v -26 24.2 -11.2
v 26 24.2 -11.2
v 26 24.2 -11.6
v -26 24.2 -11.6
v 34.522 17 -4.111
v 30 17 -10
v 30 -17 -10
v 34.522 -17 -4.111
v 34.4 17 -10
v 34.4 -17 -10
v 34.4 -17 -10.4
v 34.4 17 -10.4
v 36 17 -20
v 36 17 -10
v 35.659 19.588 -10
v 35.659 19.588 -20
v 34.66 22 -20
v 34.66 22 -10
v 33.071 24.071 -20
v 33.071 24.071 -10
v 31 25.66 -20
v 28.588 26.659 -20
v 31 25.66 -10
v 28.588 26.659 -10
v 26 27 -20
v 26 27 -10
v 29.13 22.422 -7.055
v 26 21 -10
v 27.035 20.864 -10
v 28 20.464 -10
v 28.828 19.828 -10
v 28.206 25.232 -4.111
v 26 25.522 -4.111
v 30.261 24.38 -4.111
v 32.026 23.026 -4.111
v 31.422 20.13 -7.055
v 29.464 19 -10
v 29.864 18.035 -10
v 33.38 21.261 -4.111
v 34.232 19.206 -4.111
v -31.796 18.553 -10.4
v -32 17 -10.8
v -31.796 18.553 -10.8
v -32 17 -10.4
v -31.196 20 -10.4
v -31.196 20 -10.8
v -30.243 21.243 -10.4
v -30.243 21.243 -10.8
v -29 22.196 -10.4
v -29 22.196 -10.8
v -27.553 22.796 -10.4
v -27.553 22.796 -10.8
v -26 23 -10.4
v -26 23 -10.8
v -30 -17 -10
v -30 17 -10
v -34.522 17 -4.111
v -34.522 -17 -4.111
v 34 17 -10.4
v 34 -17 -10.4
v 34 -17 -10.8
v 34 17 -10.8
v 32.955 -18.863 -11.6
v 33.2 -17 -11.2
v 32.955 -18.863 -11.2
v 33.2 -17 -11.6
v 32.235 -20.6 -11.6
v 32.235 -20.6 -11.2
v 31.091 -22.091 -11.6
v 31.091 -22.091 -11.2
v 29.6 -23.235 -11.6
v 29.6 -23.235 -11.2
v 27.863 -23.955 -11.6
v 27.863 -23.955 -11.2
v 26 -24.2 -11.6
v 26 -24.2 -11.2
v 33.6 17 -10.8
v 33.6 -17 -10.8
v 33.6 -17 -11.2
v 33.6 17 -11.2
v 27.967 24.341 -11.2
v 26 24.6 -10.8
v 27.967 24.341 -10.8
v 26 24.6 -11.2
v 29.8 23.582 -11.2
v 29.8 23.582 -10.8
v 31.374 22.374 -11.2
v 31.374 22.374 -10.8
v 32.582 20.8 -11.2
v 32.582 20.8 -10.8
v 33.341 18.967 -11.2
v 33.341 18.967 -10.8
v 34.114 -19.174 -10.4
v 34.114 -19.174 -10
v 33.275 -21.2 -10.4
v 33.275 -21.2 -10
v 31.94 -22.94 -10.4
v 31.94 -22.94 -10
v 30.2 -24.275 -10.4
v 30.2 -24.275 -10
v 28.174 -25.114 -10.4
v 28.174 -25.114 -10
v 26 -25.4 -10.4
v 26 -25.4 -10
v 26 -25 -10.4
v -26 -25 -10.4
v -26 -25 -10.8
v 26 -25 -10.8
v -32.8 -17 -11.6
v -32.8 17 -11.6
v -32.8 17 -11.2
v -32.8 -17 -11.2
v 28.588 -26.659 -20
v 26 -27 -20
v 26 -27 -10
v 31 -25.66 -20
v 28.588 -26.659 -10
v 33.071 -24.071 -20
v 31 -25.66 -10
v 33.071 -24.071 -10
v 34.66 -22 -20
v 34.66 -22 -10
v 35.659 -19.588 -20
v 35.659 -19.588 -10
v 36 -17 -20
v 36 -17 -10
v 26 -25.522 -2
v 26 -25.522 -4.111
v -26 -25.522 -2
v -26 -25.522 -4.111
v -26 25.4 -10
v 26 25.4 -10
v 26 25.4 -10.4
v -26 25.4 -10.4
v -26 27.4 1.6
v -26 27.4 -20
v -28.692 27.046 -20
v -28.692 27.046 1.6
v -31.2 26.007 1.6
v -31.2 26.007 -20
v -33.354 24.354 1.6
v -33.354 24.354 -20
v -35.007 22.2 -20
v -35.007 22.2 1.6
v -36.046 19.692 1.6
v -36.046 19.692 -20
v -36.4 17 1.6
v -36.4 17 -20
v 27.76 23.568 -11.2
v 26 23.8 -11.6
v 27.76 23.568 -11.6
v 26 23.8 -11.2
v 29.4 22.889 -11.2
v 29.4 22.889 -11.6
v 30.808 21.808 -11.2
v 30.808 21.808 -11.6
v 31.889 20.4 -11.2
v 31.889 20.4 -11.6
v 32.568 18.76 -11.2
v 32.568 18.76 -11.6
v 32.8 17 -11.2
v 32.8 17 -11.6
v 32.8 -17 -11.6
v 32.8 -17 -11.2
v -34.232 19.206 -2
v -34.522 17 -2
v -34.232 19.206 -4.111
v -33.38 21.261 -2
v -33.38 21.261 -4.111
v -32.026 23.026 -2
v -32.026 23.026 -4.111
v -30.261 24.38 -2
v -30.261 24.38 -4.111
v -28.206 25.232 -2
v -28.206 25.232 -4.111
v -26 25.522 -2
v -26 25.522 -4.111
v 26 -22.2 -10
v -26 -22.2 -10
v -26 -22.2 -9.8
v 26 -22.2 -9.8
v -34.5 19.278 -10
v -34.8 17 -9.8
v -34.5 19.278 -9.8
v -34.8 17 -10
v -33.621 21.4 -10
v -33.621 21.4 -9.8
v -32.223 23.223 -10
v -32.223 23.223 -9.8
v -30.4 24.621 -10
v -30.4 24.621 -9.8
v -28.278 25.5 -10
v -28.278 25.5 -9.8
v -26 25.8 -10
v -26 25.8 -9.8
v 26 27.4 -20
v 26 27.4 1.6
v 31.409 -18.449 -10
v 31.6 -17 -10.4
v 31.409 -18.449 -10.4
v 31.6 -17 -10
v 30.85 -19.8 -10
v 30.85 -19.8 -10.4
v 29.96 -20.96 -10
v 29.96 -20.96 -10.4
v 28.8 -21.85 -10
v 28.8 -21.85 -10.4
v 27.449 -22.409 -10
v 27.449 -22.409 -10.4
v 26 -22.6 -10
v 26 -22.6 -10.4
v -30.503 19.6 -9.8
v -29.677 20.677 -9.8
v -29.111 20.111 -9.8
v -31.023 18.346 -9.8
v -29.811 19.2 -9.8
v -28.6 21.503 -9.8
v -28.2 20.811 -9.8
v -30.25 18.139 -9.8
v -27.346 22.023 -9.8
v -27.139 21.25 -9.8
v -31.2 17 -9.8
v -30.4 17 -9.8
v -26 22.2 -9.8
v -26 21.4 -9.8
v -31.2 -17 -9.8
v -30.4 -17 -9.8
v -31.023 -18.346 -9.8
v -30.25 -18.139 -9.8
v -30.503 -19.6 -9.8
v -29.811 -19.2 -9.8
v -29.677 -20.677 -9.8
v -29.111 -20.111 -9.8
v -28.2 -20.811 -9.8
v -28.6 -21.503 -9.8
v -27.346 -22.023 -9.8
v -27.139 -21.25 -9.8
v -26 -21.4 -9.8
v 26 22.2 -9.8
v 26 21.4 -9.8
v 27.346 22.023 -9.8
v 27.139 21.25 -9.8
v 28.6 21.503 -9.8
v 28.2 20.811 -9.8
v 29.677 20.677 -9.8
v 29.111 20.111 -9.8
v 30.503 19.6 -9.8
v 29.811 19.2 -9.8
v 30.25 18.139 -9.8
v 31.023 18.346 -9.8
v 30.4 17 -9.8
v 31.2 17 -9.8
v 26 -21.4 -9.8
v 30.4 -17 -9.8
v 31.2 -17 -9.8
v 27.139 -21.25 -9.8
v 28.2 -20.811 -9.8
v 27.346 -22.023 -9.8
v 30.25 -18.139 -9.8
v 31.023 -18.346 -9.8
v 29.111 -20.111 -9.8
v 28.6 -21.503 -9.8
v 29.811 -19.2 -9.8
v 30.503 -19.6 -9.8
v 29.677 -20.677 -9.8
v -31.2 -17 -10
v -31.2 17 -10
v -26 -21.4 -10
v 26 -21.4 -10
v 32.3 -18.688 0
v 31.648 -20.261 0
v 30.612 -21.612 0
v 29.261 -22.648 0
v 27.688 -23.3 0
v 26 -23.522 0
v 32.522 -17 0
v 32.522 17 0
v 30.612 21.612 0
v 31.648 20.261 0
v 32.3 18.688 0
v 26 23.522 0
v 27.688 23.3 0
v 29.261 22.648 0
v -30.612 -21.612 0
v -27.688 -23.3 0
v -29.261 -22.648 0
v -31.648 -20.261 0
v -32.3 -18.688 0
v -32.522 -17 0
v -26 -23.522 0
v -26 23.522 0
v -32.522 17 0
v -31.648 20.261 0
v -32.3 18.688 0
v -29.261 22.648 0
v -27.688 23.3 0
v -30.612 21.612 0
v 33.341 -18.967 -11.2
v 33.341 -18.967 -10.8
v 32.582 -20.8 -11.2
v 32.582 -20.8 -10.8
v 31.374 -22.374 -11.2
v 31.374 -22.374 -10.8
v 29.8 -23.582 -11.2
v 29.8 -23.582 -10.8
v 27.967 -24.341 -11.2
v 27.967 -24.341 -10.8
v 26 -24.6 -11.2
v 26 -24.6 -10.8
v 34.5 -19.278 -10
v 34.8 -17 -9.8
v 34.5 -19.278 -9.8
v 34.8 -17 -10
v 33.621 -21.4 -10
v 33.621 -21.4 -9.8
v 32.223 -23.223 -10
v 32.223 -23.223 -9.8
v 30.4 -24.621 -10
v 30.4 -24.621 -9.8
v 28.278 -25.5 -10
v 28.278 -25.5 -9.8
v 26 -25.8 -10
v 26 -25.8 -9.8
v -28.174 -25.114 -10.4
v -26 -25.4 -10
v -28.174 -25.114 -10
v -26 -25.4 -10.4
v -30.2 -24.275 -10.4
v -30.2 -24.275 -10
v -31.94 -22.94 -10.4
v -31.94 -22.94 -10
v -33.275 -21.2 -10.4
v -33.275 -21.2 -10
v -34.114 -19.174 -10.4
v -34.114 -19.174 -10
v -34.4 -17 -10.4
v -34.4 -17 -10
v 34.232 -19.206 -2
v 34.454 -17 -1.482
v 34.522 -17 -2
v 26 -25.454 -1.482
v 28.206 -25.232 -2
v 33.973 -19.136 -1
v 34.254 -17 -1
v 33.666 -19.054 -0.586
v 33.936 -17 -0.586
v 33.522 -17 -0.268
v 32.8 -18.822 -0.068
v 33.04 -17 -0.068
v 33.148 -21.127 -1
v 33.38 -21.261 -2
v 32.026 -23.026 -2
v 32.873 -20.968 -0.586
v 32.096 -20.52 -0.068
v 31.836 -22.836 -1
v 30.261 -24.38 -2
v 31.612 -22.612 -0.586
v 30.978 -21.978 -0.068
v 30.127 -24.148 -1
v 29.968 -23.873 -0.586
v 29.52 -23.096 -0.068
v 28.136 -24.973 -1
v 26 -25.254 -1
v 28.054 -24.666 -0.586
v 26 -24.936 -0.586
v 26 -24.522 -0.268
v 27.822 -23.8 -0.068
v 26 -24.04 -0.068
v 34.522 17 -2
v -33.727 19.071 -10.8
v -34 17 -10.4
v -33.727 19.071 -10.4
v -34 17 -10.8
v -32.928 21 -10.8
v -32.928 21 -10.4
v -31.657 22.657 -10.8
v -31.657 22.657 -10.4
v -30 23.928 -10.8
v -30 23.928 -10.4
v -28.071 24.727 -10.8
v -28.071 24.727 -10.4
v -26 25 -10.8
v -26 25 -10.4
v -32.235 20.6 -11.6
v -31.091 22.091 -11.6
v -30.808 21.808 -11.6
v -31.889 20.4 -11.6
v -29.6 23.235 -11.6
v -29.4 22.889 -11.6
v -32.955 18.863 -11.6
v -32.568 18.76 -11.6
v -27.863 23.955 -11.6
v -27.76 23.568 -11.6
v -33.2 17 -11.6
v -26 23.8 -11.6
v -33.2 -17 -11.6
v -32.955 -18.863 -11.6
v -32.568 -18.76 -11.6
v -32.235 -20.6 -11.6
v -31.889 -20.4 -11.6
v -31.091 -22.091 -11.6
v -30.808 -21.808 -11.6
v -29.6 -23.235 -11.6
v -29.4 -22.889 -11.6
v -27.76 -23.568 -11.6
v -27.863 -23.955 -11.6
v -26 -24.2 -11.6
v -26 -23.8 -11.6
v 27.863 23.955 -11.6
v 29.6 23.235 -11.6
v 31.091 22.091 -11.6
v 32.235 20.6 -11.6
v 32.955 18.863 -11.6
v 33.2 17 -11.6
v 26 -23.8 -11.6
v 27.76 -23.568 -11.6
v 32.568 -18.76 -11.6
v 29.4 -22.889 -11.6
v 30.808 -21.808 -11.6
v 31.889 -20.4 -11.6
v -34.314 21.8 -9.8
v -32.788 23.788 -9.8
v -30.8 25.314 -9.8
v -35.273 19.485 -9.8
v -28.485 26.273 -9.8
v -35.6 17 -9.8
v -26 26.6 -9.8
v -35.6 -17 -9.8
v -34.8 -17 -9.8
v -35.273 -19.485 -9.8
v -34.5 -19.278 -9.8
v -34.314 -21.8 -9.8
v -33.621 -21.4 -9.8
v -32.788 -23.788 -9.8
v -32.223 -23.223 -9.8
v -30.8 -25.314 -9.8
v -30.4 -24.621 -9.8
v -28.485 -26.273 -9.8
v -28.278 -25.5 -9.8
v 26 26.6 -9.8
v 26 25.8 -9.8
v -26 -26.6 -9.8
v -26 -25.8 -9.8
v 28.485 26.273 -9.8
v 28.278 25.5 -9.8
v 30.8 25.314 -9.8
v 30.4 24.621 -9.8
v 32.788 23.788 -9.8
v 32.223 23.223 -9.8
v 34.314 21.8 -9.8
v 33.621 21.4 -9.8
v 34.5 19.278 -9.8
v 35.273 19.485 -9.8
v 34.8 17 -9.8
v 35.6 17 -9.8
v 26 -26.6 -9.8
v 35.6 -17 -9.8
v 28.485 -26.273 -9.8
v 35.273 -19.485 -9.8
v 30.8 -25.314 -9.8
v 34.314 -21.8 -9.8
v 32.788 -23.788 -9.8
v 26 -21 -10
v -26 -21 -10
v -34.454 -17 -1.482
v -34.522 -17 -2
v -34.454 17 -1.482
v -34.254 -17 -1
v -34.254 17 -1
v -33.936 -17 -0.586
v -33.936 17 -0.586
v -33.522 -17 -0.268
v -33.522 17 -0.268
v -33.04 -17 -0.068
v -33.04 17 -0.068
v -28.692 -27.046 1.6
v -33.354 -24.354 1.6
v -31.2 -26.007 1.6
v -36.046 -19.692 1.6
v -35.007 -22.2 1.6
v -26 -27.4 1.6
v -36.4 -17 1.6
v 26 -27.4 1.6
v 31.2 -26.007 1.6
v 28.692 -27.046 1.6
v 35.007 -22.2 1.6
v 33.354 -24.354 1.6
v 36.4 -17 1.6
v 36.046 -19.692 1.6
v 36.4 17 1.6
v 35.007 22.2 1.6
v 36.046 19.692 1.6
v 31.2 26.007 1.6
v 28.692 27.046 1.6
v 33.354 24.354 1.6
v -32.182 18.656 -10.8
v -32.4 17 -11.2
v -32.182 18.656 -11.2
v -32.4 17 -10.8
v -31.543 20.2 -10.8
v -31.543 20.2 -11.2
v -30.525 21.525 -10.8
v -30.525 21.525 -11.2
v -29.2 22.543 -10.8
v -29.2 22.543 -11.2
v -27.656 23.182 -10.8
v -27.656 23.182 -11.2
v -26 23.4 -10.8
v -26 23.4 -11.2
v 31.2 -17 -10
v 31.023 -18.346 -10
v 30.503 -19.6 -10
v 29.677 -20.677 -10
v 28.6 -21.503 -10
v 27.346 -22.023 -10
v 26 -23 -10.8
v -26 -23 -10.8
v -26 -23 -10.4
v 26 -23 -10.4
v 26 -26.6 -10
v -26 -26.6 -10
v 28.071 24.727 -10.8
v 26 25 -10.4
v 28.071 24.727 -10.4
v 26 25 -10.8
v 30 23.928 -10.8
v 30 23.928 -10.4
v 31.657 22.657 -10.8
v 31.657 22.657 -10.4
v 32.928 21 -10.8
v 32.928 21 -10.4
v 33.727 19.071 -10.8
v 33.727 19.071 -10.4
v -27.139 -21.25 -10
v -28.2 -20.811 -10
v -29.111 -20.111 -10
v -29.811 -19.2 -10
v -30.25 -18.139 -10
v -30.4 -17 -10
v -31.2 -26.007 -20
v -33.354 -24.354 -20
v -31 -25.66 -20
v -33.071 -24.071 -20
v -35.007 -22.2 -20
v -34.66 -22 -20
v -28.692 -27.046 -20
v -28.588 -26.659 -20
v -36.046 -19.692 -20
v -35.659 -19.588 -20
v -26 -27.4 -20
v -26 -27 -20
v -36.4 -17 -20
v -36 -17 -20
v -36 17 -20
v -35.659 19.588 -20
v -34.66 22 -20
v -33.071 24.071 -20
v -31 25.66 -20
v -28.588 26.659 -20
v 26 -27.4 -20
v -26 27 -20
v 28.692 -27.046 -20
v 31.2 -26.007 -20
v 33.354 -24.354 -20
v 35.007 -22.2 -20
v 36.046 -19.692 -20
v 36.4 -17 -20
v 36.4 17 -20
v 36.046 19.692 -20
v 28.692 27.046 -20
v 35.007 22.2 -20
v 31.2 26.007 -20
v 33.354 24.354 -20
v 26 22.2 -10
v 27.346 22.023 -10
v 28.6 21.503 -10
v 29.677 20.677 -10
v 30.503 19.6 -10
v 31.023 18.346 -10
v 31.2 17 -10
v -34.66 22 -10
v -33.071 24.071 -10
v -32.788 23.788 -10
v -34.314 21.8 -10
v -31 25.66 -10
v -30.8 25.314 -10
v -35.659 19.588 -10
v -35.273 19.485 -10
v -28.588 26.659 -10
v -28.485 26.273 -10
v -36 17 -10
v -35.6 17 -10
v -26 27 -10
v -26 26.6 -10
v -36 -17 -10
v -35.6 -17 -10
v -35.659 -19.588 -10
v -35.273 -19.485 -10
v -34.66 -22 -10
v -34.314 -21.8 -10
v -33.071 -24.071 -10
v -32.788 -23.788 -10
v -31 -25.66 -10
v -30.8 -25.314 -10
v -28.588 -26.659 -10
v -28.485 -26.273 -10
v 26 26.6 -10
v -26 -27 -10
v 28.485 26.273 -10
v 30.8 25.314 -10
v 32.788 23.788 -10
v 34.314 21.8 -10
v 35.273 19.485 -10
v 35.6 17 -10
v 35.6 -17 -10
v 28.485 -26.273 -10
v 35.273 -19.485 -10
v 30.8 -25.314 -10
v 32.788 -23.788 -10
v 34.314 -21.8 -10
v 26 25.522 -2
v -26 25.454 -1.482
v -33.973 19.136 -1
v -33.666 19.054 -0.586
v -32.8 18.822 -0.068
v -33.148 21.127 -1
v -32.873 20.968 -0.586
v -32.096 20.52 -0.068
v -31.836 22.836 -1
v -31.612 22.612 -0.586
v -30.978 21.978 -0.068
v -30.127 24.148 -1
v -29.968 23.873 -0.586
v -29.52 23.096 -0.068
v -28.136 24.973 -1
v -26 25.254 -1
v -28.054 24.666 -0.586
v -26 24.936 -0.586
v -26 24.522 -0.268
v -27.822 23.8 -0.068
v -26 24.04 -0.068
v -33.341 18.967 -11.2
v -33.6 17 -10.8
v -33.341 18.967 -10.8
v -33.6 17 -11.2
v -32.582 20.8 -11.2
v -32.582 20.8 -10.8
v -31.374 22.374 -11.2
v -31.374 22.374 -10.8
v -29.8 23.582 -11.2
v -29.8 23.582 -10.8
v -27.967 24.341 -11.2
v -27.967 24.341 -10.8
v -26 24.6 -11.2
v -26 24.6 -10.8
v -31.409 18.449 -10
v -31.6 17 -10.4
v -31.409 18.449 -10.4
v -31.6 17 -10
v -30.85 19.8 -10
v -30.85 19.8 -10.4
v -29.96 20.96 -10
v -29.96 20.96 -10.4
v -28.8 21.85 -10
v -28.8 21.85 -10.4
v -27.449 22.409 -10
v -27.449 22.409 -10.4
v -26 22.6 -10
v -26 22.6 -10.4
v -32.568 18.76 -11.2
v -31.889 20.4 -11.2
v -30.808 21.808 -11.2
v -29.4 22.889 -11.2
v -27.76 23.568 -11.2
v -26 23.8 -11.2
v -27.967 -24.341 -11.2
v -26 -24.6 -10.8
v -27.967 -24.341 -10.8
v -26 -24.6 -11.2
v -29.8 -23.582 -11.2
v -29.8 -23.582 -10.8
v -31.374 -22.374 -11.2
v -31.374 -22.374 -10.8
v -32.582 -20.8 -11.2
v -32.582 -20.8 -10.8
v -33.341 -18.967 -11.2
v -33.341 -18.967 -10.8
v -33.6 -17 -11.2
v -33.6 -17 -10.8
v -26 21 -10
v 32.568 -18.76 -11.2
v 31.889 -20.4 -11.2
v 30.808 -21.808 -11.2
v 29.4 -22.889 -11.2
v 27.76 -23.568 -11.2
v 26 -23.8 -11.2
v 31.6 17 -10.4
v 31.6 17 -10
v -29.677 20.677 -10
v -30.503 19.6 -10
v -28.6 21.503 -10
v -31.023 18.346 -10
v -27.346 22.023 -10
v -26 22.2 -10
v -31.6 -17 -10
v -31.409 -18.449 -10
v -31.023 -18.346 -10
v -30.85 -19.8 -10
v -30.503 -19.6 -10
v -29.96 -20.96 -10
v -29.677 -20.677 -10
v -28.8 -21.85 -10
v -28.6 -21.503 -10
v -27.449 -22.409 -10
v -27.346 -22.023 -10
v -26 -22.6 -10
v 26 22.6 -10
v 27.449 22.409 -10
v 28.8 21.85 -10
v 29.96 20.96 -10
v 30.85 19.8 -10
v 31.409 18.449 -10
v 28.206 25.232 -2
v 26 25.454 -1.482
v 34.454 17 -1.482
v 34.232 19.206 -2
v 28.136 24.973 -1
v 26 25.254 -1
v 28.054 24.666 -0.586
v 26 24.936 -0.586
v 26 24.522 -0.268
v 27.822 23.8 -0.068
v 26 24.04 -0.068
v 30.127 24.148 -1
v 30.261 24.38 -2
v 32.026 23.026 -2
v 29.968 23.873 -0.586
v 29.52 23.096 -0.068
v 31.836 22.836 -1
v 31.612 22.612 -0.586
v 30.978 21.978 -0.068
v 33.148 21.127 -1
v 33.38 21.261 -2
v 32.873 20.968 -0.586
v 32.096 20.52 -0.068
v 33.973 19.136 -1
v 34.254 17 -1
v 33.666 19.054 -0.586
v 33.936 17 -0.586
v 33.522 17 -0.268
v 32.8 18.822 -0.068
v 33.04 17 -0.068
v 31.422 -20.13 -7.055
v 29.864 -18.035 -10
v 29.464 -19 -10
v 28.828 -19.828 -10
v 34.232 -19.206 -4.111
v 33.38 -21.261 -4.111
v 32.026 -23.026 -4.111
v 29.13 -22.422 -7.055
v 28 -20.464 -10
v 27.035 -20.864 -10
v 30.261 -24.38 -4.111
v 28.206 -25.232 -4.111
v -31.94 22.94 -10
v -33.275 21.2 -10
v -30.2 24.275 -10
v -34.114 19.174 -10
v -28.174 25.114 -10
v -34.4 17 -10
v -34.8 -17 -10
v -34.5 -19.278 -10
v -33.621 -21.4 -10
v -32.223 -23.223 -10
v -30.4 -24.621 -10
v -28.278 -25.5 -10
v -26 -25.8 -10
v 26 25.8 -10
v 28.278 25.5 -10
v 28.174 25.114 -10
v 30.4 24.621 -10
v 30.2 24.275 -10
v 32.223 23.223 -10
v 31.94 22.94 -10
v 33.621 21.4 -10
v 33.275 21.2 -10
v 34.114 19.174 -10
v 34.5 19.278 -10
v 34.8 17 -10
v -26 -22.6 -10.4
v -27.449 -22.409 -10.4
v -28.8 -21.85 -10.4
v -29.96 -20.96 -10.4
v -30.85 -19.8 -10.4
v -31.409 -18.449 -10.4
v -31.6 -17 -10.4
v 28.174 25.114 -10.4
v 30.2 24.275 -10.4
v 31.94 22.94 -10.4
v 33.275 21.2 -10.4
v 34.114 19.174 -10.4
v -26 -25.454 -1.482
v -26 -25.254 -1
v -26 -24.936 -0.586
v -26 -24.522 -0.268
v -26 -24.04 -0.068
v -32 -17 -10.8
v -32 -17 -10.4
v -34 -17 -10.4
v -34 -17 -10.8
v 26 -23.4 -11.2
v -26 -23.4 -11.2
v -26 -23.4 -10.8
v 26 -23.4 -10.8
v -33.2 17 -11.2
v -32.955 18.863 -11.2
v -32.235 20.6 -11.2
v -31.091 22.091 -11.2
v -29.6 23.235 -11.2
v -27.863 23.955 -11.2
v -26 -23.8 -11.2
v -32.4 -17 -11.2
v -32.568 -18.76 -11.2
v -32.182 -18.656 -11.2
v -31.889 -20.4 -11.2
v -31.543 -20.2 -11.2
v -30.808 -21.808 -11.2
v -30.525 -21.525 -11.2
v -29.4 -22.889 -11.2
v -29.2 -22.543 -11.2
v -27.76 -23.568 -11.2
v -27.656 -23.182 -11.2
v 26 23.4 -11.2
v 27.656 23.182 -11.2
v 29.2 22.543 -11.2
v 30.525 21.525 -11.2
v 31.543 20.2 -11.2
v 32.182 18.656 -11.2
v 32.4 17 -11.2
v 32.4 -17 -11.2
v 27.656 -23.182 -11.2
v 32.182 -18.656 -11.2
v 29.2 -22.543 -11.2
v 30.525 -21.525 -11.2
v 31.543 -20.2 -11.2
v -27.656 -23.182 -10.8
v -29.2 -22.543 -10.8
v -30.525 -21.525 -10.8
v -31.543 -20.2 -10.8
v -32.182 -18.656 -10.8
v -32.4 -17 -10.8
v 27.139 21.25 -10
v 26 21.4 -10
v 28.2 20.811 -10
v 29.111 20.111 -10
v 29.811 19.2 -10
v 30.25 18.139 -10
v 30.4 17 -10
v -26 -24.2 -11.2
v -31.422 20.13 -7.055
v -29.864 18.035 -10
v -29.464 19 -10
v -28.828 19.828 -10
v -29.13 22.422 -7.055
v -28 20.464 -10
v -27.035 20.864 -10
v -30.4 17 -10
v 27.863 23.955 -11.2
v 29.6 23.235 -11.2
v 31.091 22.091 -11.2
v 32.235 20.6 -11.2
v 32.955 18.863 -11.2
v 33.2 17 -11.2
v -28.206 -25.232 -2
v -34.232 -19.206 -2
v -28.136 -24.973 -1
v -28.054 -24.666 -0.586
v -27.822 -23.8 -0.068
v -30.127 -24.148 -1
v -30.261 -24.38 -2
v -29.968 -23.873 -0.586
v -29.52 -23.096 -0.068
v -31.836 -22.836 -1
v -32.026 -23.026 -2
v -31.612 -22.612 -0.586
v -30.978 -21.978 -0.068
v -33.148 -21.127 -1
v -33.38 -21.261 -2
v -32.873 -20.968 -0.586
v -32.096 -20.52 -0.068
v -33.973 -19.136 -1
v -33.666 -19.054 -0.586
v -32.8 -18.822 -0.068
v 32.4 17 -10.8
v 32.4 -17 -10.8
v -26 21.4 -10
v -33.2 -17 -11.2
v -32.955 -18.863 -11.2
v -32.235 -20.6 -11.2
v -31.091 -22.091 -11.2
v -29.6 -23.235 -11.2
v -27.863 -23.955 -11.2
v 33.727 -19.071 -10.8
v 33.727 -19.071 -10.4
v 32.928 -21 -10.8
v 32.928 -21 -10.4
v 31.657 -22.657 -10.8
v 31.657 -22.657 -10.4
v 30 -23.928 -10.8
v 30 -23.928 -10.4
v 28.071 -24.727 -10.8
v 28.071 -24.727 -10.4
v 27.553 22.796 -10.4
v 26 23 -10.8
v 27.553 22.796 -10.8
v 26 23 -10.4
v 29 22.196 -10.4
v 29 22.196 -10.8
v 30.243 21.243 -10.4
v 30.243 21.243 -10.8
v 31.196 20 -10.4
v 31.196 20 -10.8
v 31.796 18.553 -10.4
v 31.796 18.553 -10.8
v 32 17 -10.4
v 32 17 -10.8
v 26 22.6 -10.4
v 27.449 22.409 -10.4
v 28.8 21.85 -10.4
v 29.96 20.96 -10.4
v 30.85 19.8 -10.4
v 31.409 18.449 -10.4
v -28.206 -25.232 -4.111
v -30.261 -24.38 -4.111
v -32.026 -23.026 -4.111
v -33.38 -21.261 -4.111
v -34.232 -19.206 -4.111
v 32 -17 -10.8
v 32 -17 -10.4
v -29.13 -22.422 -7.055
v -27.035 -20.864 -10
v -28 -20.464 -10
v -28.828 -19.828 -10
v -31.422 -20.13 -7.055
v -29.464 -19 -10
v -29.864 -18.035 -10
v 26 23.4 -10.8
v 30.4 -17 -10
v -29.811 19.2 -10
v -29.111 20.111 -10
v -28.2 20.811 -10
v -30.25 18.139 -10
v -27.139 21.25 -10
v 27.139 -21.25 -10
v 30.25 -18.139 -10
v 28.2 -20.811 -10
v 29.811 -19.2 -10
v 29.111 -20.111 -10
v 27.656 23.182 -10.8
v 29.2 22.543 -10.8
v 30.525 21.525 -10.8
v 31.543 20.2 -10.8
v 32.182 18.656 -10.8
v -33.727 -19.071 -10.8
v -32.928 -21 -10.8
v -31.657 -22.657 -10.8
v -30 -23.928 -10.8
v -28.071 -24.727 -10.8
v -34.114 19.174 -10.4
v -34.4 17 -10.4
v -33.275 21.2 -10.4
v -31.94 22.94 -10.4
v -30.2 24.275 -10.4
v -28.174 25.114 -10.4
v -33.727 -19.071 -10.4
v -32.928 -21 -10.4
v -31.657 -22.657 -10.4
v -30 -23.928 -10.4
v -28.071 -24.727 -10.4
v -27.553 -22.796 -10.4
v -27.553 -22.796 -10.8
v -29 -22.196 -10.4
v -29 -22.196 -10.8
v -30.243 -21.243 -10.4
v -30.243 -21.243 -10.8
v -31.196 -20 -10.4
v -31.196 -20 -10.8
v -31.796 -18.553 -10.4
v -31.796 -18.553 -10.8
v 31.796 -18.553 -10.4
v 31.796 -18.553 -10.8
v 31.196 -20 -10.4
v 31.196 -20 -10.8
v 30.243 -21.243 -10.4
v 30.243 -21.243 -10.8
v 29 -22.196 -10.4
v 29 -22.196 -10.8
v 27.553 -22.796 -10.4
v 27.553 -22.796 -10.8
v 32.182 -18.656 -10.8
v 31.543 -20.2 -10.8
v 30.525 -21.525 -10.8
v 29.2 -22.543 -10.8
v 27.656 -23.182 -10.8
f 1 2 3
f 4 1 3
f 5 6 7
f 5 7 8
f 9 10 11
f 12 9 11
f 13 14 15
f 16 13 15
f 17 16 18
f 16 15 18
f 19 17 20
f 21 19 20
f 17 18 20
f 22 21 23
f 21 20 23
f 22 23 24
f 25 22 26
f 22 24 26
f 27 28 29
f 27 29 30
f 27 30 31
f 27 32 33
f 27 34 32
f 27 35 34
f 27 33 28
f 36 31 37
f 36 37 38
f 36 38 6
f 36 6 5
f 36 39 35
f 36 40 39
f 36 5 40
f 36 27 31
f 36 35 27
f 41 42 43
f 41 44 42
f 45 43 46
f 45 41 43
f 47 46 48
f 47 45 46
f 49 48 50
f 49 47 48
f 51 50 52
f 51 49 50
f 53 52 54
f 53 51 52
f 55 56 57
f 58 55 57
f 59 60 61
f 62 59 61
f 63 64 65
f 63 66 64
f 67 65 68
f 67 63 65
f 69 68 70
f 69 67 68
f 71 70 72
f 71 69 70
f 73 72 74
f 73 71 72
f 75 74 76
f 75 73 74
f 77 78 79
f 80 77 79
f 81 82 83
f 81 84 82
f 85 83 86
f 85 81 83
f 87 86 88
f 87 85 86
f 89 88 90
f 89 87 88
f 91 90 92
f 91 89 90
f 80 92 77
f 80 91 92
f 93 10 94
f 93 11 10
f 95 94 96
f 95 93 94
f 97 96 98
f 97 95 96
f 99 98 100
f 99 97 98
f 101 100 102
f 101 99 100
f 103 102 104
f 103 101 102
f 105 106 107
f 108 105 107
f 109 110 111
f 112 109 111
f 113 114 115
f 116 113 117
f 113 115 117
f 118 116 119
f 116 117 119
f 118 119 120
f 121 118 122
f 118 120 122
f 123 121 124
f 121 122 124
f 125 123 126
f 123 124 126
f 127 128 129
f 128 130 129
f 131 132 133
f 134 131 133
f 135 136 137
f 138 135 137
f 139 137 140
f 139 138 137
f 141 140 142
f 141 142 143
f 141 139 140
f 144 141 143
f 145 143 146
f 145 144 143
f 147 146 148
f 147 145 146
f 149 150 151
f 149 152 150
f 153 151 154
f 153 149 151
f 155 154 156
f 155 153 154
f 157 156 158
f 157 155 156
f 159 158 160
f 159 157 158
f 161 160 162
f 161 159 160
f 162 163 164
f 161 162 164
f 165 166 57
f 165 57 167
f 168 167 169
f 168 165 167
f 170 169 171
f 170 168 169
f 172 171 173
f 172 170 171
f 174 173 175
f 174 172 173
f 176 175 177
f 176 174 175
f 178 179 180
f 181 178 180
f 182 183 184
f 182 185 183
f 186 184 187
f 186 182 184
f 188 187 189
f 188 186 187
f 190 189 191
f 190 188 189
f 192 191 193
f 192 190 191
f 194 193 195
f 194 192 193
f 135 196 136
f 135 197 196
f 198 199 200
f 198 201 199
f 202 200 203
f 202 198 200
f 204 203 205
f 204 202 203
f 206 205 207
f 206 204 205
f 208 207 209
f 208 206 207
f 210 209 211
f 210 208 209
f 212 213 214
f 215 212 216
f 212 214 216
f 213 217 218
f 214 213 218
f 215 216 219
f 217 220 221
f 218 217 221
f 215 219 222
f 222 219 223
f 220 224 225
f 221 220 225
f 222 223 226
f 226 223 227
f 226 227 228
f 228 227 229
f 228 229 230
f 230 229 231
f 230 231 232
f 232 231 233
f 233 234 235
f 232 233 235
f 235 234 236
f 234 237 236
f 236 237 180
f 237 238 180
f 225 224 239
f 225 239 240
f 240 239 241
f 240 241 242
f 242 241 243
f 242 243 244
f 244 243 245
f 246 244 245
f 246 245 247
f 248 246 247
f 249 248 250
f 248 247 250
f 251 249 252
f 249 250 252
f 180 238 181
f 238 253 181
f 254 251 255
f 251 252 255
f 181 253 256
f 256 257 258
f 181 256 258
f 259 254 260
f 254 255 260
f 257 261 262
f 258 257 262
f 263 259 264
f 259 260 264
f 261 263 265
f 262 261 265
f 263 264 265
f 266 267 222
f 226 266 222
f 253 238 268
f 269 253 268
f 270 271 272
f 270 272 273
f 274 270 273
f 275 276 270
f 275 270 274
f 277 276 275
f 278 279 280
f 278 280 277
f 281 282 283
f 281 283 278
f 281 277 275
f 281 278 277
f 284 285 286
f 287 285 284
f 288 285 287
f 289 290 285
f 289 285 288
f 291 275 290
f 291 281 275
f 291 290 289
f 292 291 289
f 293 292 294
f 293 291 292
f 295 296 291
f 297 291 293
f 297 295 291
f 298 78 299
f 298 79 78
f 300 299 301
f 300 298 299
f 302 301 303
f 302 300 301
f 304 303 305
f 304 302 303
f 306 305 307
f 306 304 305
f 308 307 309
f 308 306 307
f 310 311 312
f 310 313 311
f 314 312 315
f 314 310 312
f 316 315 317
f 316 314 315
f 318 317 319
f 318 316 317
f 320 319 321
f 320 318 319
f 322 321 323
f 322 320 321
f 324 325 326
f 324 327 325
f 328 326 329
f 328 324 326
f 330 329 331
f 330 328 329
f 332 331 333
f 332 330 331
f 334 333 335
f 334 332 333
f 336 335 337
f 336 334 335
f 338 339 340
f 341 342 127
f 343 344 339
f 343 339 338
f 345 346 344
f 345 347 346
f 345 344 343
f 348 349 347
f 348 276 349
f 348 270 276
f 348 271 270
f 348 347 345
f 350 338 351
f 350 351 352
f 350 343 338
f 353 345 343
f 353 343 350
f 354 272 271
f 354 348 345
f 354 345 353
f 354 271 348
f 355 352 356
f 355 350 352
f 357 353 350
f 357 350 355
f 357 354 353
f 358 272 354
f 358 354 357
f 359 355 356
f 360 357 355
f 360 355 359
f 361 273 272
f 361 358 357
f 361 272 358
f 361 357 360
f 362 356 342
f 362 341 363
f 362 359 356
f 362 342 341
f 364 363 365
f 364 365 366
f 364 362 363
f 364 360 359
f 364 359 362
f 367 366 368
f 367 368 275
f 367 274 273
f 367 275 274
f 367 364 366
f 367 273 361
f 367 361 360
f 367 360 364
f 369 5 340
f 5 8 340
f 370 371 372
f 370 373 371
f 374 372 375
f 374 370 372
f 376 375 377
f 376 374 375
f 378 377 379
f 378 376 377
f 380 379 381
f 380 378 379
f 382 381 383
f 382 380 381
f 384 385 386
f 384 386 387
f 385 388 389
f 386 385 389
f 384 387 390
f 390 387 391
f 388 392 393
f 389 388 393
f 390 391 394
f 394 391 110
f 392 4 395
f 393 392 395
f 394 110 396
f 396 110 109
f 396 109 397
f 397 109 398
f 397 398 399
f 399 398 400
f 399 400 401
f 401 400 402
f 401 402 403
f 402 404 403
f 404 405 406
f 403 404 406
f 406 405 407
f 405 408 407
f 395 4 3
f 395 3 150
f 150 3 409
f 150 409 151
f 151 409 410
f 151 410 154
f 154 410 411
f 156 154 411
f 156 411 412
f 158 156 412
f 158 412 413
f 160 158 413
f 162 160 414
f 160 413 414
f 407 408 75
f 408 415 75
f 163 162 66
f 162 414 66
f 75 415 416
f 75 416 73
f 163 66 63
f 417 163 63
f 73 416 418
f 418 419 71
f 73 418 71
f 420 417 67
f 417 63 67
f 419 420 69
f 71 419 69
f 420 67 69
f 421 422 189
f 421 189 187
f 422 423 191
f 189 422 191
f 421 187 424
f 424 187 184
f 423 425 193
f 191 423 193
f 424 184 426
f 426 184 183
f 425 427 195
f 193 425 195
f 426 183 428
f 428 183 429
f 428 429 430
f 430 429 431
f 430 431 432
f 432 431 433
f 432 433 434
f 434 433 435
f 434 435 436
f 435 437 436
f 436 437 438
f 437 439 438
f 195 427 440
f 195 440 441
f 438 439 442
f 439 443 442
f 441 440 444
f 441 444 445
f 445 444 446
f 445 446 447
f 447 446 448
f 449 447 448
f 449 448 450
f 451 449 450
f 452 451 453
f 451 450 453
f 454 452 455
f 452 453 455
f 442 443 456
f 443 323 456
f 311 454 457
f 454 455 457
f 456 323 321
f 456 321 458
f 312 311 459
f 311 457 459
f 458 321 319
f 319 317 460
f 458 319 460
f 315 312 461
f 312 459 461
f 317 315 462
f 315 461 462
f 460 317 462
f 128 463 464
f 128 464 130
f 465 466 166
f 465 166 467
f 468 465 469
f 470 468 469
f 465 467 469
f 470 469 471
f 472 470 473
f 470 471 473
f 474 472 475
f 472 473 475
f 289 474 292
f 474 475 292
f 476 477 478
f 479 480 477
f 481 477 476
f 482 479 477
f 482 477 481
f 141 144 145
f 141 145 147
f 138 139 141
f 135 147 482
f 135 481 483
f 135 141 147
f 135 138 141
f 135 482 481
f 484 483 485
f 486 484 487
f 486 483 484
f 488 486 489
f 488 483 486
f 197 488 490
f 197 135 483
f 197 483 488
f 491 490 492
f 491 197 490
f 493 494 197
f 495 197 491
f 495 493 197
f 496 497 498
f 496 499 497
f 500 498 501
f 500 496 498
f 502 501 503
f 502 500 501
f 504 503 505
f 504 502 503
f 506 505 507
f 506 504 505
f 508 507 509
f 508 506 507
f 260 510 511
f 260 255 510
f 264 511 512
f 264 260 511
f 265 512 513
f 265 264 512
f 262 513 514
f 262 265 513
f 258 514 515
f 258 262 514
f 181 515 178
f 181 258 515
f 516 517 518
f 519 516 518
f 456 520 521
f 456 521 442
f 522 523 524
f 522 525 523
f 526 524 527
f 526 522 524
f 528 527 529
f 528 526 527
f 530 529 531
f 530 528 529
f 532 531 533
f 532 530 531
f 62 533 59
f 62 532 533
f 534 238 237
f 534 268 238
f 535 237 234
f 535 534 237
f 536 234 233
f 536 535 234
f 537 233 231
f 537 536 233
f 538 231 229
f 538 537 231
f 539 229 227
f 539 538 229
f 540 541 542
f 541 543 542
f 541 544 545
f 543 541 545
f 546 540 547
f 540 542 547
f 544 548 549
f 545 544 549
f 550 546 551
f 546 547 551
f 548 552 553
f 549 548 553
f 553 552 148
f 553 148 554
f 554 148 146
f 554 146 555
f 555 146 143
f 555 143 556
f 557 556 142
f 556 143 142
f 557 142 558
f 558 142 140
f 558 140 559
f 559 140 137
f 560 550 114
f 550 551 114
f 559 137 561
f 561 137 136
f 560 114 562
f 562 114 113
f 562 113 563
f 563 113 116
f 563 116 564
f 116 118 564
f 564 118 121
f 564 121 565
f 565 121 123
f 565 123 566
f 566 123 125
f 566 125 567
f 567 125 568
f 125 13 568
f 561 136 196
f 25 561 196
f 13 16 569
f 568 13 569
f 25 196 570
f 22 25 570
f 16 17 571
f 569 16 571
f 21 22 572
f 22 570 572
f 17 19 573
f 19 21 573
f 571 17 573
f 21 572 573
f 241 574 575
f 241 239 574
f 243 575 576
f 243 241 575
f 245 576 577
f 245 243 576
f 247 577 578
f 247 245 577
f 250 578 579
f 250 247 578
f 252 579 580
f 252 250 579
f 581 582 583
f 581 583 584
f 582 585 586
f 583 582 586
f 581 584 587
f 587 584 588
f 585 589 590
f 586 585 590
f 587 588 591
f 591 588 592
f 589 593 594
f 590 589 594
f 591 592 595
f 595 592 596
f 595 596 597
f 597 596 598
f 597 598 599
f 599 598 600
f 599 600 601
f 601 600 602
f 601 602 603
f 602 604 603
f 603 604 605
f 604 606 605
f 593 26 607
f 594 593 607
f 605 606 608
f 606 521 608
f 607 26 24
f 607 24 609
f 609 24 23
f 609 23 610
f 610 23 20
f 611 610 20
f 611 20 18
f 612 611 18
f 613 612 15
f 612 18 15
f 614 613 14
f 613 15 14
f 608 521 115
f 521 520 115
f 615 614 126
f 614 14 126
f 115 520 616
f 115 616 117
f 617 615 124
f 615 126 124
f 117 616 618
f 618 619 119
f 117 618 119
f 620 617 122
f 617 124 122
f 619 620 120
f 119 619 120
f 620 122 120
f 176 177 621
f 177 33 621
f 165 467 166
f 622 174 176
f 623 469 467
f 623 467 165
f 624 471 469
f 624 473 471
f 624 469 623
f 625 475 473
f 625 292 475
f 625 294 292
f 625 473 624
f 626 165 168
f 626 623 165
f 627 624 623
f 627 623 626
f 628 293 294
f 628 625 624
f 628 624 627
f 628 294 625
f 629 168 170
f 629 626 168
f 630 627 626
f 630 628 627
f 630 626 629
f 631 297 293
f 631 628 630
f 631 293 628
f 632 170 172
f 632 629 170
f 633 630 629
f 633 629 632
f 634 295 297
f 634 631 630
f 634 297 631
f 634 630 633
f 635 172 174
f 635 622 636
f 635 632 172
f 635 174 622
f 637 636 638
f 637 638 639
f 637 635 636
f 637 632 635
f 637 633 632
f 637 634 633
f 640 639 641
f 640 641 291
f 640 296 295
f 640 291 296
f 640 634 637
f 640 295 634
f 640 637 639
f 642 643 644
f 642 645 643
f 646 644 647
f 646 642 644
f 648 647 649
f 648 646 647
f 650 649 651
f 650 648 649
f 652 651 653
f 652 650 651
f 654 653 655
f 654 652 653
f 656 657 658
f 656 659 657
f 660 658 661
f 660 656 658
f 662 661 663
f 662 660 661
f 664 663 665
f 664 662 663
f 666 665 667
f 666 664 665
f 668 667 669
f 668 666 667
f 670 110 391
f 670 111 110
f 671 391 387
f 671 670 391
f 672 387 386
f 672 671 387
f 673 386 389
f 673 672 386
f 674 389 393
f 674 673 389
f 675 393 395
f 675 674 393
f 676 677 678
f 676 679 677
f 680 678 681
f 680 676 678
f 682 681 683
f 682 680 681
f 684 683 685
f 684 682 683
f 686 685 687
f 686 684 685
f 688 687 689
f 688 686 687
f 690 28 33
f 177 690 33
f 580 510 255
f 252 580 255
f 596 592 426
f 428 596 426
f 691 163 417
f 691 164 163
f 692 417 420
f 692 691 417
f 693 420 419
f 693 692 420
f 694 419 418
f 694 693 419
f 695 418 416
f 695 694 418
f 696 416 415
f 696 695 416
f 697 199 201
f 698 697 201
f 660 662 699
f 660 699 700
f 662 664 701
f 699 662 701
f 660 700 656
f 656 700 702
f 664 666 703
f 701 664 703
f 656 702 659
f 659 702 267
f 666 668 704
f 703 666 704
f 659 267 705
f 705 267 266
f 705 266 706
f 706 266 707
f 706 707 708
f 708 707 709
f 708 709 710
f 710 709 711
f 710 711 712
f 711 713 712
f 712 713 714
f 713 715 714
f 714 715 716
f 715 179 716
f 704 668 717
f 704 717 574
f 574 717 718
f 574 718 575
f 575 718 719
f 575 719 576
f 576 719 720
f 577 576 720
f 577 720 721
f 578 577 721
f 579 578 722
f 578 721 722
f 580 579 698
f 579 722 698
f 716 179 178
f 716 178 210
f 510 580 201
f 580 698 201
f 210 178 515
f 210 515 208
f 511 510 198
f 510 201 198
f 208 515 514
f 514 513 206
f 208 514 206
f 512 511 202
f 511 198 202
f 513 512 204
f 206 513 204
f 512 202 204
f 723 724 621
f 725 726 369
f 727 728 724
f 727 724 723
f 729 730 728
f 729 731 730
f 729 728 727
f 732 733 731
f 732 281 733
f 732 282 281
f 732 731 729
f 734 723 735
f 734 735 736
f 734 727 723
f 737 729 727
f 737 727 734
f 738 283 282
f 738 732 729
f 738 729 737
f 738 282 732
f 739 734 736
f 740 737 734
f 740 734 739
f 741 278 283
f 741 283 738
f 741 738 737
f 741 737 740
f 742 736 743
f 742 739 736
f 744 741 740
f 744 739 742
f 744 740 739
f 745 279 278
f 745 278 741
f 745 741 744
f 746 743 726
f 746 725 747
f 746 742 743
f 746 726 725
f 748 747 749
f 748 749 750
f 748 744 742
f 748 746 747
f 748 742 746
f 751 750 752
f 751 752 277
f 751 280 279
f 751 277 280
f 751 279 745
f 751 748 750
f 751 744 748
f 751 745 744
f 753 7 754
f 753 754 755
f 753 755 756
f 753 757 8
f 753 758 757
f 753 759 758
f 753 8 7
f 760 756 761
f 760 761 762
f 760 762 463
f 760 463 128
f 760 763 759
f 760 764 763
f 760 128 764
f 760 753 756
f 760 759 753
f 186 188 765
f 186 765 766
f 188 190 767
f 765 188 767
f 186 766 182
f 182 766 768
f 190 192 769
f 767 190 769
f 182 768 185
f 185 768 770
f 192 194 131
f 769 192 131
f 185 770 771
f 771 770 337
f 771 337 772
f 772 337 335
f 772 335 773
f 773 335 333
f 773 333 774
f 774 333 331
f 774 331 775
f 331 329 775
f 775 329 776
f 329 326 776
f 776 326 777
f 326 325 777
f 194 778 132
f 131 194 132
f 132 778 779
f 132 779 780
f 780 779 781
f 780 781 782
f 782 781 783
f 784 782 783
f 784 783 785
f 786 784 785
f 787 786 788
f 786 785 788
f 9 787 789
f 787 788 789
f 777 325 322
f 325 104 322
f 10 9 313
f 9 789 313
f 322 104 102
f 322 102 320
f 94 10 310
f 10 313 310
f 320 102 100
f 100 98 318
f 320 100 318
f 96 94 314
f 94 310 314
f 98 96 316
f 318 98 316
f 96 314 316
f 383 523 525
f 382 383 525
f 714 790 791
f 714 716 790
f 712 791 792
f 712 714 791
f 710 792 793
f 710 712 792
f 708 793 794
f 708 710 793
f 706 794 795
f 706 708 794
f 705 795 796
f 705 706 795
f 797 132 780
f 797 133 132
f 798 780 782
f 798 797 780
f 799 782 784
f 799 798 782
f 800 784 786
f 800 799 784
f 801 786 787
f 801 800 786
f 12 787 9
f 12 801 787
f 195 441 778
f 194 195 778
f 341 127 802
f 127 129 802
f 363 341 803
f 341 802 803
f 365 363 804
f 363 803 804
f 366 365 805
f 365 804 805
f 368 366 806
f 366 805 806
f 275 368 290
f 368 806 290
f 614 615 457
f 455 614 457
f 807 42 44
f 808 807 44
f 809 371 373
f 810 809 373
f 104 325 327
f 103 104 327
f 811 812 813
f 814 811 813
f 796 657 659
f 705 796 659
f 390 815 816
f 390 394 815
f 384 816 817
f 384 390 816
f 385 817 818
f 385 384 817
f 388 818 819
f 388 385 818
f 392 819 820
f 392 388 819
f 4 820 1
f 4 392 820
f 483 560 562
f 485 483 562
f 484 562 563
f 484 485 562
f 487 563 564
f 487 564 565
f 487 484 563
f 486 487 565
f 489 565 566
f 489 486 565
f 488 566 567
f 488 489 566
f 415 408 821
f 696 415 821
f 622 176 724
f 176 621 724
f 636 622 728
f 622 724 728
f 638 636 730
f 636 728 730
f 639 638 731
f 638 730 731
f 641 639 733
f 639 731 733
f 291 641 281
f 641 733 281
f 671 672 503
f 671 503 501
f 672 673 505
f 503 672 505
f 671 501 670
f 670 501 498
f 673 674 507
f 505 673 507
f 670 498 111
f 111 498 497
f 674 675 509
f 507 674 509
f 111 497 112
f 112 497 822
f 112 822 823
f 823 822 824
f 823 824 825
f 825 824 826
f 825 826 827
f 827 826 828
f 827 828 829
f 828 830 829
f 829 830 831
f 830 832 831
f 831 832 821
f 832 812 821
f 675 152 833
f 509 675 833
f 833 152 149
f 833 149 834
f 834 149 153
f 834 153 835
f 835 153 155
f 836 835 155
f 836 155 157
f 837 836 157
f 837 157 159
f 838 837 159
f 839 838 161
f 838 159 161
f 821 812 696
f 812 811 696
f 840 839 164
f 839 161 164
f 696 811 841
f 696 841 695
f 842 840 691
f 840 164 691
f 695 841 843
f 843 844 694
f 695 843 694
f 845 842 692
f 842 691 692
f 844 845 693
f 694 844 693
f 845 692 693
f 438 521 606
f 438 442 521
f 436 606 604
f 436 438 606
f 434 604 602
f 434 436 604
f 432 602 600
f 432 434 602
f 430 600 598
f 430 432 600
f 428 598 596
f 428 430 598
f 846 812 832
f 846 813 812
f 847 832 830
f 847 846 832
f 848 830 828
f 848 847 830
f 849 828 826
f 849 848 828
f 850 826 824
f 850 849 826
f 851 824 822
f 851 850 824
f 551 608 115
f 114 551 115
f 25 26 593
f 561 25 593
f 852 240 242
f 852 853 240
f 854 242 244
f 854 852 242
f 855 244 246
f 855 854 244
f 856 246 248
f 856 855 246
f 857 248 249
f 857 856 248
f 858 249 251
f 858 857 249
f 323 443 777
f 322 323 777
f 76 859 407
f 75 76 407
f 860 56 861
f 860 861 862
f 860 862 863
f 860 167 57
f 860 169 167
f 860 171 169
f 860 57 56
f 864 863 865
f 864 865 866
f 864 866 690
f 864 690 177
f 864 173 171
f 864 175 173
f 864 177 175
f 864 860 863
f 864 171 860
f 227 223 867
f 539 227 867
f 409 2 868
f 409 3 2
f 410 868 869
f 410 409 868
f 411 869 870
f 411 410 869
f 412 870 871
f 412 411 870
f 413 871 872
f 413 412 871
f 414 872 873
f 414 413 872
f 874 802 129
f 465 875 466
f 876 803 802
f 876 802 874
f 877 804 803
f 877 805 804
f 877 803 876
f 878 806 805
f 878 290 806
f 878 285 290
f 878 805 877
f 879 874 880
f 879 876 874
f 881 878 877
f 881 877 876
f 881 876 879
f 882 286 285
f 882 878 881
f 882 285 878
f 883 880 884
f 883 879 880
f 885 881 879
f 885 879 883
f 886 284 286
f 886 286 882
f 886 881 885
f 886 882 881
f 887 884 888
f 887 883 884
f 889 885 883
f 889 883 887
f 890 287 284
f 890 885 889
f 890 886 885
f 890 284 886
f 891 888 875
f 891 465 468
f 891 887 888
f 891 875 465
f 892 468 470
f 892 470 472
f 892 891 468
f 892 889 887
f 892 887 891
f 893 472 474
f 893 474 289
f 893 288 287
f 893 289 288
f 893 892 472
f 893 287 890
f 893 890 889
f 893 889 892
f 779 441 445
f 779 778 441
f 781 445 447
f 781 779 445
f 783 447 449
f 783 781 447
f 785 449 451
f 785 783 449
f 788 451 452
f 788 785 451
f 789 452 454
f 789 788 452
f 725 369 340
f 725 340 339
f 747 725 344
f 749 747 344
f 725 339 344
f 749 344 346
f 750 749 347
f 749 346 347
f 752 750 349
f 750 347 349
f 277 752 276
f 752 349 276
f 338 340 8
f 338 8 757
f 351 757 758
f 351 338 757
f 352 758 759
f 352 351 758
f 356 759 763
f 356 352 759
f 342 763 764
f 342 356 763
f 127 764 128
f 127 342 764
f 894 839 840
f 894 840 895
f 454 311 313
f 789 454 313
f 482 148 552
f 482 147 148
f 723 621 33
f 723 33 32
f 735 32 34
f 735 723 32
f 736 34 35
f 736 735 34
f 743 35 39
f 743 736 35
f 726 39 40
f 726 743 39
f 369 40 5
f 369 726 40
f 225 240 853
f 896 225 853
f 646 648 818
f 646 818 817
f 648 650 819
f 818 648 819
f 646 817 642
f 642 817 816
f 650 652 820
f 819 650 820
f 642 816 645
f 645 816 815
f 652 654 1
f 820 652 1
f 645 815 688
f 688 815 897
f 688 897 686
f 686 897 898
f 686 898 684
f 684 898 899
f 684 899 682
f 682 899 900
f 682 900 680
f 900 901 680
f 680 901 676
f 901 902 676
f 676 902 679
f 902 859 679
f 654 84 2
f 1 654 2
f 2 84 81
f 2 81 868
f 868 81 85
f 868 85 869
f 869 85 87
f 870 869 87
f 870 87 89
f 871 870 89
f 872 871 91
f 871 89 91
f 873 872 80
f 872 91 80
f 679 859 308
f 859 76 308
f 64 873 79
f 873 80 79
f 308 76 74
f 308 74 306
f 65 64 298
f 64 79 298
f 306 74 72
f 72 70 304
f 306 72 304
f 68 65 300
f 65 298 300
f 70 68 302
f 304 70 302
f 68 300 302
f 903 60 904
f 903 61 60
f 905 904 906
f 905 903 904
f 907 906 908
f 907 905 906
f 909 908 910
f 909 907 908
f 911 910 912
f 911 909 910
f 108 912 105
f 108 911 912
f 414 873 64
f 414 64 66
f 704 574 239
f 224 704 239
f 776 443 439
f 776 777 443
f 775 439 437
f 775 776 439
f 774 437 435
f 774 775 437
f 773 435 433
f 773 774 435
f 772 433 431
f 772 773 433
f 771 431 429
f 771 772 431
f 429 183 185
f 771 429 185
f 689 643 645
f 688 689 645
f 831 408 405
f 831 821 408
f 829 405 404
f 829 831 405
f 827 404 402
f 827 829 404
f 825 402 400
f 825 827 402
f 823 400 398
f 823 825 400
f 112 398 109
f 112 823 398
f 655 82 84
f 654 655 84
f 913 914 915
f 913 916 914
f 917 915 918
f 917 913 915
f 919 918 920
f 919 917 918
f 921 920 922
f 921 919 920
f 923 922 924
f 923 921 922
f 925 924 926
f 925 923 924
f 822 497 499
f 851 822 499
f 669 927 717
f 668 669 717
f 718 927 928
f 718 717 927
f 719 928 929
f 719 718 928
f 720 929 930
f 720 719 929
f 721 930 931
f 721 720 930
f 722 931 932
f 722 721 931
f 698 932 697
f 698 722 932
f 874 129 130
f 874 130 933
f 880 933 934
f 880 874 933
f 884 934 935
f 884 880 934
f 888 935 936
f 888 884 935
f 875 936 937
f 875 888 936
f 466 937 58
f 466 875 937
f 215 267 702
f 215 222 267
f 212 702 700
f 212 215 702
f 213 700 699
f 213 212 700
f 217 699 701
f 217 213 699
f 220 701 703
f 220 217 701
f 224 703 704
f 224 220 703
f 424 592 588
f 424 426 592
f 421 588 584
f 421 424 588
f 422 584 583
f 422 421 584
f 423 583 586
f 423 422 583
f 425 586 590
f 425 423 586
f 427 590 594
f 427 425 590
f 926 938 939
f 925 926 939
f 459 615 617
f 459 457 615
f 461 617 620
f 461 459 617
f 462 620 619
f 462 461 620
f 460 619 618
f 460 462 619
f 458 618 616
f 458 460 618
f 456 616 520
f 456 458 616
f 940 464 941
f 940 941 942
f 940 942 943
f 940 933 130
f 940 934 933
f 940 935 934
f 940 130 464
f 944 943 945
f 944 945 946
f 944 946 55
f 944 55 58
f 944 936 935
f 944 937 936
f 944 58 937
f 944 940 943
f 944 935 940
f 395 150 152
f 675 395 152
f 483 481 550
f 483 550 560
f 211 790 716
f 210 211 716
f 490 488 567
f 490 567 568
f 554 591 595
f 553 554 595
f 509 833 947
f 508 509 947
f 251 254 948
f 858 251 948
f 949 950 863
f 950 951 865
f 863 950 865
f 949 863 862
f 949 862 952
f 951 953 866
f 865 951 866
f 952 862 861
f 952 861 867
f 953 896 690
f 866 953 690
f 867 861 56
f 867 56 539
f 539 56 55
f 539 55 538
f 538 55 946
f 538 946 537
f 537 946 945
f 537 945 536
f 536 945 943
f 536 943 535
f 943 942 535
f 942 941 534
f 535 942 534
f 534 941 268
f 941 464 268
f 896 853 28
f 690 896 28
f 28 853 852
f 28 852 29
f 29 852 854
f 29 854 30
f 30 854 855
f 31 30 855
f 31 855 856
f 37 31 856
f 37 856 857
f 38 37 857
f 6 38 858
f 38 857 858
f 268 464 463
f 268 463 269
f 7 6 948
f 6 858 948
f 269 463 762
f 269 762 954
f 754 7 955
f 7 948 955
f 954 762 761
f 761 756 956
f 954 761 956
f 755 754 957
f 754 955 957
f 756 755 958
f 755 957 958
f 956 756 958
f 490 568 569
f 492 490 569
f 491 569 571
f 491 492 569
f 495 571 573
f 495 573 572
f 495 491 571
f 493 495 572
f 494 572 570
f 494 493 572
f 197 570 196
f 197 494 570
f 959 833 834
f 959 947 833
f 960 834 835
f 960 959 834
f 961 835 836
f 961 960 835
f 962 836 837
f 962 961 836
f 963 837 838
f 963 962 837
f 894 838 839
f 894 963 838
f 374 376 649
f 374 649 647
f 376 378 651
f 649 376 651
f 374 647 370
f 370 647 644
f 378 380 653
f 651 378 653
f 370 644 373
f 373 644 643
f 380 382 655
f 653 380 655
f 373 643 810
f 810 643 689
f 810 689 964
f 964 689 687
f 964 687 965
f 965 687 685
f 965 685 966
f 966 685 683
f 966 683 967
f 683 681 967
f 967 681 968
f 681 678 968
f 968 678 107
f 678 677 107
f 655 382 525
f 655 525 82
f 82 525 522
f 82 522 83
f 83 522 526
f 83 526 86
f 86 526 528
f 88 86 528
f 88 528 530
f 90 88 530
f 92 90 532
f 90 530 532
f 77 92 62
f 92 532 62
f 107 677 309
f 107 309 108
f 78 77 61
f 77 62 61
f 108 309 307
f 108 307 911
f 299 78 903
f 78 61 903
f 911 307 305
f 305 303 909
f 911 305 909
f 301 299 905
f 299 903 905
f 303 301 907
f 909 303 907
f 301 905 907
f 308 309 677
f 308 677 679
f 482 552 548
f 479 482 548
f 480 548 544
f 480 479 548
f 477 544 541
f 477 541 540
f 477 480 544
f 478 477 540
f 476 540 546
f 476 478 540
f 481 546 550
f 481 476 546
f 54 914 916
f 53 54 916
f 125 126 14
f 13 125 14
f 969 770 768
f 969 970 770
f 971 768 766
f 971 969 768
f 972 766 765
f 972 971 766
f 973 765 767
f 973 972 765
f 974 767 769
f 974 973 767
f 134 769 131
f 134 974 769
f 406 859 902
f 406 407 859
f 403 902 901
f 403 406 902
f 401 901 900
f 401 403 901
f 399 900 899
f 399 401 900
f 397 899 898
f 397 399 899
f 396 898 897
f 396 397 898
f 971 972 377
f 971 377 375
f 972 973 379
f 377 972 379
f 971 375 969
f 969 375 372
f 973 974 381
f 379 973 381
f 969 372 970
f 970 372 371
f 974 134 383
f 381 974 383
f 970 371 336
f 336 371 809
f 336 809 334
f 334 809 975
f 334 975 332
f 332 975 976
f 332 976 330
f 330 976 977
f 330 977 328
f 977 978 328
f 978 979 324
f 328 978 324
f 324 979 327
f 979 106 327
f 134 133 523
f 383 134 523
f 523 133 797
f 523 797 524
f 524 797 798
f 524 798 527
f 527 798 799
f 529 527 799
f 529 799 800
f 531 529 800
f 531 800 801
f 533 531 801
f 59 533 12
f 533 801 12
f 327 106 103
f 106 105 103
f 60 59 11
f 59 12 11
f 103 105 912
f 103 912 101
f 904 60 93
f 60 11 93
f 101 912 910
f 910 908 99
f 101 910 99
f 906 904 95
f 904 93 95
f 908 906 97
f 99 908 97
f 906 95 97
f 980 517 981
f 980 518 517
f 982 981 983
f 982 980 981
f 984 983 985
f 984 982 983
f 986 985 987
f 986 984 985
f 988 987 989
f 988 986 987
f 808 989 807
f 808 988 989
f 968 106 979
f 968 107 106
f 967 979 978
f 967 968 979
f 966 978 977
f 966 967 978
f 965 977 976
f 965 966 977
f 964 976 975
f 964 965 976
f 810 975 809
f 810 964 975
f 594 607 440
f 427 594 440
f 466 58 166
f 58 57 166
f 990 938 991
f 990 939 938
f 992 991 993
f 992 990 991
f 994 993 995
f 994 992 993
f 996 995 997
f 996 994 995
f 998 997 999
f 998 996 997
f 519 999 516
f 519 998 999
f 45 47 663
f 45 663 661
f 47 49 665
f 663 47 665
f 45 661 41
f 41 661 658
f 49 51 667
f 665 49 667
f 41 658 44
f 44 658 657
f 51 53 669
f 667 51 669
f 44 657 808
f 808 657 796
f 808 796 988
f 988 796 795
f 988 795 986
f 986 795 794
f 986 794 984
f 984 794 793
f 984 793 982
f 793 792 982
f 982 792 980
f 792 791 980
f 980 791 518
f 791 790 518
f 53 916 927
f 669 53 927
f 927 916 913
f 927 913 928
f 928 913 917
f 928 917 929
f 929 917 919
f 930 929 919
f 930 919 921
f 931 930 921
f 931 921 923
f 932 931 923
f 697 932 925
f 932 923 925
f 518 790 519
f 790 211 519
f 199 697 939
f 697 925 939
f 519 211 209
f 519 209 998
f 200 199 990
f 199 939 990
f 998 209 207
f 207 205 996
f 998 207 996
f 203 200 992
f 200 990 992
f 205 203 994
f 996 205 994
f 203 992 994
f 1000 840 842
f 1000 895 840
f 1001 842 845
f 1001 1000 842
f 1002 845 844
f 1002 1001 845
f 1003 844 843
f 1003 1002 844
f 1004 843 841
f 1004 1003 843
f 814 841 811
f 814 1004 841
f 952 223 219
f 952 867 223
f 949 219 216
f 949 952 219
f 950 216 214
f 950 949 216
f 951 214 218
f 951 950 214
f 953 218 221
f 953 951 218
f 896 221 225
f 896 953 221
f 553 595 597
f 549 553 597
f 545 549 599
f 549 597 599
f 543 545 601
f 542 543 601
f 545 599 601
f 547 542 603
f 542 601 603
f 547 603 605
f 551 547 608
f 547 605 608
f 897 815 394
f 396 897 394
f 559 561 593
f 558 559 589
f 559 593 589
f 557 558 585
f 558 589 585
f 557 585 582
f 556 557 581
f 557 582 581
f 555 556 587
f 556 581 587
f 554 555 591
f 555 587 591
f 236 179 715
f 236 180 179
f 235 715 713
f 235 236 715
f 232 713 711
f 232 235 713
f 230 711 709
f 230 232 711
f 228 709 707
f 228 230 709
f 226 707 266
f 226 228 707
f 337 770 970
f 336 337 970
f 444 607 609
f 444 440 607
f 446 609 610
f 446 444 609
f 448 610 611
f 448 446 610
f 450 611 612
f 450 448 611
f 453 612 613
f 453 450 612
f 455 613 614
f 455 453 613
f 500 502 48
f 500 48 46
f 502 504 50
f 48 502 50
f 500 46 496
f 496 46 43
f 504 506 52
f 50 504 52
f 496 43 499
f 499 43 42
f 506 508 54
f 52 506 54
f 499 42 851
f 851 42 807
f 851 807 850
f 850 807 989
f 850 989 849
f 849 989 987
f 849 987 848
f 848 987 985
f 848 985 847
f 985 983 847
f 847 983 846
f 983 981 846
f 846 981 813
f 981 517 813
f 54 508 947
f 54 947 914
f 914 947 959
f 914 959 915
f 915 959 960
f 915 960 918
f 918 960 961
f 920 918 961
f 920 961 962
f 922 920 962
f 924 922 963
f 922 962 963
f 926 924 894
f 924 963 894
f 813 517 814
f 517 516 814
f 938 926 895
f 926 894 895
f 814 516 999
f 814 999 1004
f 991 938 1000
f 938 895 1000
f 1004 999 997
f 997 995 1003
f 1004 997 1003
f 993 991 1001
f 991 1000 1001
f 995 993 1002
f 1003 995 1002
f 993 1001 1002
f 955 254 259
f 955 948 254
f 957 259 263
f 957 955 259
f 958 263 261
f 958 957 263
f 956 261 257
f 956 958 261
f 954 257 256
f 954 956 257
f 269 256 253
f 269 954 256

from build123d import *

# Parameters (mm, degrees)
BOSS_EXTRU_1_DEPTH      = 1.6
CONG_1_R                = 2
EXTRU_MINCE1_DEPTH      = 1.6
EXTRU_MINCE1_DEPTH_BACK = 20


with BuildPart() as part:
    # Balayage1: sweep along a path in Esquisse1
    with BuildLine(Plane.XY) as balayage1_path:
        Line((-26, 27), (26, 27))
        ThreePointArc((26, 27), (33.071067812, 24.071067812), (36, 17))
        Line((36, 17), (36, -17))
        ThreePointArc((36, -17), (33.071067812, -24.071067812), (26, -27))
        Line((26, -27), (-26, -27))
        ThreePointArc((-26, -27), (-33.071067812, -24.071067812), (-36, -17))
        Line((-36, -17), (-36, 17))
        ThreePointArc((-36, 17), (-33.071067812, 24.071067812), (-26, 27))
    # profil → Balayage1 (sweep)
    with BuildSketch(Plane(origin=(0, 0, 0), x_dir=(0, 0, -1), z_dir=(1, 0, 0))):
        Polygon((0, -25.521907401), (4.110600662, -25.521907401), (10, -21), (10, -21.4), (9.8, -21.4), (9.8, -22.2), (10, -22.2), (10, -22.6), (10.4, -22.6), (10.4, -23), (10.8, -23), (10.8, -23.4), (11.2, -23.4), (11.2, -23.8), (11.6, -23.8), (11.6, -24.2), (11.2, -24.2), (11.2, -24.6), (10.8, -24.6), (10.8, -25), (10.4, -25), (10.4, -25.4), (10, -25.4), (10, -25.8), (9.8, -25.8), (9.8, -26.6), (10, -26.6), (10, -27), (0, -27), align=None)
    sweep(path=balayage1_path.line)

    # Esquisse1<3> → Boss.-Extru.1 (add)
    with BuildSketch(Plane.XY):
        with BuildLine():
            Line((-26, 27), (26, 27))
            ThreePointArc((26, 27), (33.071067812, 24.071067812), (36, 17))
            Line((36, 17), (36, -17))
            ThreePointArc((36, -17), (33.071067812, -24.071067812), (26, -27))
            Line((26, -27), (-26, -27))
            ThreePointArc((-26, -27), (-33.071067812, -24.071067812), (-36, -17))
            Line((-36, -17), (-36, 17))
            ThreePointArc((-36, 17), (-33.071067812, 24.071067812), (-26, 27))
        make_face()
    extrude(amount=BOSS_EXTRU_1_DEPTH)

    # Congé1
    cong_1_edges = [part.edges().sort_by_distance(p)[0] for p in [
        (34.521907401, 0, 0),
        (32.025898512, -23.025898512, 0),
        (0, -25.521907401, 0),
        (-32.025898512, -23.025898512, 0),
        (-34.521907401, 0, 0),
        (-32.025898512, 23.025898512, 0),
        (0, 25.521907401, 0),
        (0, -25.521907401, 0),
        (32.025898512, 23.025898512, 0),
    ]]
    fillet(cong_1_edges, radius=CONG_1_R)

    # Esquisse2 → Extru.-Mince1 (add, two sides)
    with BuildSketch(Plane.XY) as extru_mince1_sk:
        with BuildLine():
            Line((-36.4, 17), (-36.4, -17))
            ThreePointArc((-36.4, -17), (-33.353910524, -24.353910524), (-26, -27.4))
            Line((-26, -27.4), (26, -27.4))
            ThreePointArc((26, -27.4), (33.353910524, -24.353910524), (36.4, -17))
            Line((36.4, -17), (36.4, 17))
            ThreePointArc((36.4, 17), (33.353910524, 24.353910524), (26, 27.4))
            Line((26, 27.4), (-26, 27.4))
            ThreePointArc((-26, 27.4), (-33.353910524, 24.353910524), (-36.4, 17))
        make_face()
        with BuildLine():
            Line((-36, 17), (-36, -17))
            ThreePointArc((-36, -17), (-33.071067812, -24.071067812), (-26, -27))
            Line((-26, -27), (26, -27))
            ThreePointArc((26, -27), (33.071067812, -24.071067812), (36, -17))
            Line((36, -17), (36, 17))
            ThreePointArc((36, 17), (33.071067812, 24.071067812), (26, 27))
            Line((26, 27), (-26, 27))
            ThreePointArc((-26, 27), (-33.071067812, 24.071067812), (-36, 17))
        make_face(mode=Mode.SUBTRACT)
    extrude(amount=EXTRU_MINCE1_DEPTH)
    extrude(extru_mince1_sk.sketch, amount=-EXTRU_MINCE1_DEPTH_BACK)


solid = part.part
